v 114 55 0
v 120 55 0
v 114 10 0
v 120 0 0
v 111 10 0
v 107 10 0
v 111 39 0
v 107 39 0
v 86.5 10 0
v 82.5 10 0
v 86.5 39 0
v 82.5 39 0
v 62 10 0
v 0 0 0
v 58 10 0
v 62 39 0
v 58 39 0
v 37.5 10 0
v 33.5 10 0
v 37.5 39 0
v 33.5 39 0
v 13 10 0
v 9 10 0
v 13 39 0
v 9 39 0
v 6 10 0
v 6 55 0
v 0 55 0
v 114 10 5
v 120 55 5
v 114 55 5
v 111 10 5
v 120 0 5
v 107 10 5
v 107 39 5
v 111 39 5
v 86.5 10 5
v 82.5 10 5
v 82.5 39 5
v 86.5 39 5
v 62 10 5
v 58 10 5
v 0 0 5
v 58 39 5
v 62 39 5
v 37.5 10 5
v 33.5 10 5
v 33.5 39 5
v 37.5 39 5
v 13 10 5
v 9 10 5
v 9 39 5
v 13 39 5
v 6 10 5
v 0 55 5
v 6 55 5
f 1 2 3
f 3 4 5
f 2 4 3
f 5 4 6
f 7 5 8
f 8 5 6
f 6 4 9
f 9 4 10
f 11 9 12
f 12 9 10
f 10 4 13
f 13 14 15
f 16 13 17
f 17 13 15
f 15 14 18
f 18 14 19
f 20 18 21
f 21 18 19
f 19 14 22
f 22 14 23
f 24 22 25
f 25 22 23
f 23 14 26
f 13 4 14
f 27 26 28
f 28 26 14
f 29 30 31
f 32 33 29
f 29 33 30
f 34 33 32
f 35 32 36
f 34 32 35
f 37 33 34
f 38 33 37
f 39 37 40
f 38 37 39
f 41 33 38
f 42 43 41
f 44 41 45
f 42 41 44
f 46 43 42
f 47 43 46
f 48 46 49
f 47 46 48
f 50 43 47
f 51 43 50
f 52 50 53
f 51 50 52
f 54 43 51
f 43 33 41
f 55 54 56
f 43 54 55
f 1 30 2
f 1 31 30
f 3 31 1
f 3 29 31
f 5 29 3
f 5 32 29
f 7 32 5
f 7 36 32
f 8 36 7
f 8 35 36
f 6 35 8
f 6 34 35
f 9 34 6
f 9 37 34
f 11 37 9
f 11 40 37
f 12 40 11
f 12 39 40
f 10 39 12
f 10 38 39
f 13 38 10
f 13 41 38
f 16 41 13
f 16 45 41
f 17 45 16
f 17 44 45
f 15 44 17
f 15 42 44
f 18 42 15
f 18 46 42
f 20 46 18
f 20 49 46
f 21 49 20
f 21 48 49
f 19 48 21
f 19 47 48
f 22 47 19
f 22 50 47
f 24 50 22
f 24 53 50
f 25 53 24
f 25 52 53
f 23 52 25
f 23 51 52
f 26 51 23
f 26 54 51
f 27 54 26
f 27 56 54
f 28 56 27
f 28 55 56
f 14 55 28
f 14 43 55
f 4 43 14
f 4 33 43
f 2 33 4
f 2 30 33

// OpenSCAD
$fn = 32;

// ----------------------------------------------------------------------
// Guard grille: 5 slats over a 120 x 55 mm plate
// ----------------------------------------------------------------------

// --- parameters (mm) ---
profile_height = 5;       // extrusion height
profile_points = 28;      // points of the closed outline

profile = [[0, 0], [120, 0], [120, 55], [114, 55], [114, 10], [111, 10], [111, 39], [107, 39], [107, 10], [86.5, 10], [86.5, 39], [82.5, 39], [82.5, 10], [62, 10], [62, 39], [58, 39], [58, 10], [37.5, 10], [37.5, 39], [33.5, 39], [33.5, 10], [13, 10], [13, 39], [9, 39], [9, 10], [6, 10], [6, 55], [0, 55]];  // single closed polygon, 28 points, counter clockwise

// --- the one profile operation ---
linear_extrude(height = profile_height) polygon(points = profile);
